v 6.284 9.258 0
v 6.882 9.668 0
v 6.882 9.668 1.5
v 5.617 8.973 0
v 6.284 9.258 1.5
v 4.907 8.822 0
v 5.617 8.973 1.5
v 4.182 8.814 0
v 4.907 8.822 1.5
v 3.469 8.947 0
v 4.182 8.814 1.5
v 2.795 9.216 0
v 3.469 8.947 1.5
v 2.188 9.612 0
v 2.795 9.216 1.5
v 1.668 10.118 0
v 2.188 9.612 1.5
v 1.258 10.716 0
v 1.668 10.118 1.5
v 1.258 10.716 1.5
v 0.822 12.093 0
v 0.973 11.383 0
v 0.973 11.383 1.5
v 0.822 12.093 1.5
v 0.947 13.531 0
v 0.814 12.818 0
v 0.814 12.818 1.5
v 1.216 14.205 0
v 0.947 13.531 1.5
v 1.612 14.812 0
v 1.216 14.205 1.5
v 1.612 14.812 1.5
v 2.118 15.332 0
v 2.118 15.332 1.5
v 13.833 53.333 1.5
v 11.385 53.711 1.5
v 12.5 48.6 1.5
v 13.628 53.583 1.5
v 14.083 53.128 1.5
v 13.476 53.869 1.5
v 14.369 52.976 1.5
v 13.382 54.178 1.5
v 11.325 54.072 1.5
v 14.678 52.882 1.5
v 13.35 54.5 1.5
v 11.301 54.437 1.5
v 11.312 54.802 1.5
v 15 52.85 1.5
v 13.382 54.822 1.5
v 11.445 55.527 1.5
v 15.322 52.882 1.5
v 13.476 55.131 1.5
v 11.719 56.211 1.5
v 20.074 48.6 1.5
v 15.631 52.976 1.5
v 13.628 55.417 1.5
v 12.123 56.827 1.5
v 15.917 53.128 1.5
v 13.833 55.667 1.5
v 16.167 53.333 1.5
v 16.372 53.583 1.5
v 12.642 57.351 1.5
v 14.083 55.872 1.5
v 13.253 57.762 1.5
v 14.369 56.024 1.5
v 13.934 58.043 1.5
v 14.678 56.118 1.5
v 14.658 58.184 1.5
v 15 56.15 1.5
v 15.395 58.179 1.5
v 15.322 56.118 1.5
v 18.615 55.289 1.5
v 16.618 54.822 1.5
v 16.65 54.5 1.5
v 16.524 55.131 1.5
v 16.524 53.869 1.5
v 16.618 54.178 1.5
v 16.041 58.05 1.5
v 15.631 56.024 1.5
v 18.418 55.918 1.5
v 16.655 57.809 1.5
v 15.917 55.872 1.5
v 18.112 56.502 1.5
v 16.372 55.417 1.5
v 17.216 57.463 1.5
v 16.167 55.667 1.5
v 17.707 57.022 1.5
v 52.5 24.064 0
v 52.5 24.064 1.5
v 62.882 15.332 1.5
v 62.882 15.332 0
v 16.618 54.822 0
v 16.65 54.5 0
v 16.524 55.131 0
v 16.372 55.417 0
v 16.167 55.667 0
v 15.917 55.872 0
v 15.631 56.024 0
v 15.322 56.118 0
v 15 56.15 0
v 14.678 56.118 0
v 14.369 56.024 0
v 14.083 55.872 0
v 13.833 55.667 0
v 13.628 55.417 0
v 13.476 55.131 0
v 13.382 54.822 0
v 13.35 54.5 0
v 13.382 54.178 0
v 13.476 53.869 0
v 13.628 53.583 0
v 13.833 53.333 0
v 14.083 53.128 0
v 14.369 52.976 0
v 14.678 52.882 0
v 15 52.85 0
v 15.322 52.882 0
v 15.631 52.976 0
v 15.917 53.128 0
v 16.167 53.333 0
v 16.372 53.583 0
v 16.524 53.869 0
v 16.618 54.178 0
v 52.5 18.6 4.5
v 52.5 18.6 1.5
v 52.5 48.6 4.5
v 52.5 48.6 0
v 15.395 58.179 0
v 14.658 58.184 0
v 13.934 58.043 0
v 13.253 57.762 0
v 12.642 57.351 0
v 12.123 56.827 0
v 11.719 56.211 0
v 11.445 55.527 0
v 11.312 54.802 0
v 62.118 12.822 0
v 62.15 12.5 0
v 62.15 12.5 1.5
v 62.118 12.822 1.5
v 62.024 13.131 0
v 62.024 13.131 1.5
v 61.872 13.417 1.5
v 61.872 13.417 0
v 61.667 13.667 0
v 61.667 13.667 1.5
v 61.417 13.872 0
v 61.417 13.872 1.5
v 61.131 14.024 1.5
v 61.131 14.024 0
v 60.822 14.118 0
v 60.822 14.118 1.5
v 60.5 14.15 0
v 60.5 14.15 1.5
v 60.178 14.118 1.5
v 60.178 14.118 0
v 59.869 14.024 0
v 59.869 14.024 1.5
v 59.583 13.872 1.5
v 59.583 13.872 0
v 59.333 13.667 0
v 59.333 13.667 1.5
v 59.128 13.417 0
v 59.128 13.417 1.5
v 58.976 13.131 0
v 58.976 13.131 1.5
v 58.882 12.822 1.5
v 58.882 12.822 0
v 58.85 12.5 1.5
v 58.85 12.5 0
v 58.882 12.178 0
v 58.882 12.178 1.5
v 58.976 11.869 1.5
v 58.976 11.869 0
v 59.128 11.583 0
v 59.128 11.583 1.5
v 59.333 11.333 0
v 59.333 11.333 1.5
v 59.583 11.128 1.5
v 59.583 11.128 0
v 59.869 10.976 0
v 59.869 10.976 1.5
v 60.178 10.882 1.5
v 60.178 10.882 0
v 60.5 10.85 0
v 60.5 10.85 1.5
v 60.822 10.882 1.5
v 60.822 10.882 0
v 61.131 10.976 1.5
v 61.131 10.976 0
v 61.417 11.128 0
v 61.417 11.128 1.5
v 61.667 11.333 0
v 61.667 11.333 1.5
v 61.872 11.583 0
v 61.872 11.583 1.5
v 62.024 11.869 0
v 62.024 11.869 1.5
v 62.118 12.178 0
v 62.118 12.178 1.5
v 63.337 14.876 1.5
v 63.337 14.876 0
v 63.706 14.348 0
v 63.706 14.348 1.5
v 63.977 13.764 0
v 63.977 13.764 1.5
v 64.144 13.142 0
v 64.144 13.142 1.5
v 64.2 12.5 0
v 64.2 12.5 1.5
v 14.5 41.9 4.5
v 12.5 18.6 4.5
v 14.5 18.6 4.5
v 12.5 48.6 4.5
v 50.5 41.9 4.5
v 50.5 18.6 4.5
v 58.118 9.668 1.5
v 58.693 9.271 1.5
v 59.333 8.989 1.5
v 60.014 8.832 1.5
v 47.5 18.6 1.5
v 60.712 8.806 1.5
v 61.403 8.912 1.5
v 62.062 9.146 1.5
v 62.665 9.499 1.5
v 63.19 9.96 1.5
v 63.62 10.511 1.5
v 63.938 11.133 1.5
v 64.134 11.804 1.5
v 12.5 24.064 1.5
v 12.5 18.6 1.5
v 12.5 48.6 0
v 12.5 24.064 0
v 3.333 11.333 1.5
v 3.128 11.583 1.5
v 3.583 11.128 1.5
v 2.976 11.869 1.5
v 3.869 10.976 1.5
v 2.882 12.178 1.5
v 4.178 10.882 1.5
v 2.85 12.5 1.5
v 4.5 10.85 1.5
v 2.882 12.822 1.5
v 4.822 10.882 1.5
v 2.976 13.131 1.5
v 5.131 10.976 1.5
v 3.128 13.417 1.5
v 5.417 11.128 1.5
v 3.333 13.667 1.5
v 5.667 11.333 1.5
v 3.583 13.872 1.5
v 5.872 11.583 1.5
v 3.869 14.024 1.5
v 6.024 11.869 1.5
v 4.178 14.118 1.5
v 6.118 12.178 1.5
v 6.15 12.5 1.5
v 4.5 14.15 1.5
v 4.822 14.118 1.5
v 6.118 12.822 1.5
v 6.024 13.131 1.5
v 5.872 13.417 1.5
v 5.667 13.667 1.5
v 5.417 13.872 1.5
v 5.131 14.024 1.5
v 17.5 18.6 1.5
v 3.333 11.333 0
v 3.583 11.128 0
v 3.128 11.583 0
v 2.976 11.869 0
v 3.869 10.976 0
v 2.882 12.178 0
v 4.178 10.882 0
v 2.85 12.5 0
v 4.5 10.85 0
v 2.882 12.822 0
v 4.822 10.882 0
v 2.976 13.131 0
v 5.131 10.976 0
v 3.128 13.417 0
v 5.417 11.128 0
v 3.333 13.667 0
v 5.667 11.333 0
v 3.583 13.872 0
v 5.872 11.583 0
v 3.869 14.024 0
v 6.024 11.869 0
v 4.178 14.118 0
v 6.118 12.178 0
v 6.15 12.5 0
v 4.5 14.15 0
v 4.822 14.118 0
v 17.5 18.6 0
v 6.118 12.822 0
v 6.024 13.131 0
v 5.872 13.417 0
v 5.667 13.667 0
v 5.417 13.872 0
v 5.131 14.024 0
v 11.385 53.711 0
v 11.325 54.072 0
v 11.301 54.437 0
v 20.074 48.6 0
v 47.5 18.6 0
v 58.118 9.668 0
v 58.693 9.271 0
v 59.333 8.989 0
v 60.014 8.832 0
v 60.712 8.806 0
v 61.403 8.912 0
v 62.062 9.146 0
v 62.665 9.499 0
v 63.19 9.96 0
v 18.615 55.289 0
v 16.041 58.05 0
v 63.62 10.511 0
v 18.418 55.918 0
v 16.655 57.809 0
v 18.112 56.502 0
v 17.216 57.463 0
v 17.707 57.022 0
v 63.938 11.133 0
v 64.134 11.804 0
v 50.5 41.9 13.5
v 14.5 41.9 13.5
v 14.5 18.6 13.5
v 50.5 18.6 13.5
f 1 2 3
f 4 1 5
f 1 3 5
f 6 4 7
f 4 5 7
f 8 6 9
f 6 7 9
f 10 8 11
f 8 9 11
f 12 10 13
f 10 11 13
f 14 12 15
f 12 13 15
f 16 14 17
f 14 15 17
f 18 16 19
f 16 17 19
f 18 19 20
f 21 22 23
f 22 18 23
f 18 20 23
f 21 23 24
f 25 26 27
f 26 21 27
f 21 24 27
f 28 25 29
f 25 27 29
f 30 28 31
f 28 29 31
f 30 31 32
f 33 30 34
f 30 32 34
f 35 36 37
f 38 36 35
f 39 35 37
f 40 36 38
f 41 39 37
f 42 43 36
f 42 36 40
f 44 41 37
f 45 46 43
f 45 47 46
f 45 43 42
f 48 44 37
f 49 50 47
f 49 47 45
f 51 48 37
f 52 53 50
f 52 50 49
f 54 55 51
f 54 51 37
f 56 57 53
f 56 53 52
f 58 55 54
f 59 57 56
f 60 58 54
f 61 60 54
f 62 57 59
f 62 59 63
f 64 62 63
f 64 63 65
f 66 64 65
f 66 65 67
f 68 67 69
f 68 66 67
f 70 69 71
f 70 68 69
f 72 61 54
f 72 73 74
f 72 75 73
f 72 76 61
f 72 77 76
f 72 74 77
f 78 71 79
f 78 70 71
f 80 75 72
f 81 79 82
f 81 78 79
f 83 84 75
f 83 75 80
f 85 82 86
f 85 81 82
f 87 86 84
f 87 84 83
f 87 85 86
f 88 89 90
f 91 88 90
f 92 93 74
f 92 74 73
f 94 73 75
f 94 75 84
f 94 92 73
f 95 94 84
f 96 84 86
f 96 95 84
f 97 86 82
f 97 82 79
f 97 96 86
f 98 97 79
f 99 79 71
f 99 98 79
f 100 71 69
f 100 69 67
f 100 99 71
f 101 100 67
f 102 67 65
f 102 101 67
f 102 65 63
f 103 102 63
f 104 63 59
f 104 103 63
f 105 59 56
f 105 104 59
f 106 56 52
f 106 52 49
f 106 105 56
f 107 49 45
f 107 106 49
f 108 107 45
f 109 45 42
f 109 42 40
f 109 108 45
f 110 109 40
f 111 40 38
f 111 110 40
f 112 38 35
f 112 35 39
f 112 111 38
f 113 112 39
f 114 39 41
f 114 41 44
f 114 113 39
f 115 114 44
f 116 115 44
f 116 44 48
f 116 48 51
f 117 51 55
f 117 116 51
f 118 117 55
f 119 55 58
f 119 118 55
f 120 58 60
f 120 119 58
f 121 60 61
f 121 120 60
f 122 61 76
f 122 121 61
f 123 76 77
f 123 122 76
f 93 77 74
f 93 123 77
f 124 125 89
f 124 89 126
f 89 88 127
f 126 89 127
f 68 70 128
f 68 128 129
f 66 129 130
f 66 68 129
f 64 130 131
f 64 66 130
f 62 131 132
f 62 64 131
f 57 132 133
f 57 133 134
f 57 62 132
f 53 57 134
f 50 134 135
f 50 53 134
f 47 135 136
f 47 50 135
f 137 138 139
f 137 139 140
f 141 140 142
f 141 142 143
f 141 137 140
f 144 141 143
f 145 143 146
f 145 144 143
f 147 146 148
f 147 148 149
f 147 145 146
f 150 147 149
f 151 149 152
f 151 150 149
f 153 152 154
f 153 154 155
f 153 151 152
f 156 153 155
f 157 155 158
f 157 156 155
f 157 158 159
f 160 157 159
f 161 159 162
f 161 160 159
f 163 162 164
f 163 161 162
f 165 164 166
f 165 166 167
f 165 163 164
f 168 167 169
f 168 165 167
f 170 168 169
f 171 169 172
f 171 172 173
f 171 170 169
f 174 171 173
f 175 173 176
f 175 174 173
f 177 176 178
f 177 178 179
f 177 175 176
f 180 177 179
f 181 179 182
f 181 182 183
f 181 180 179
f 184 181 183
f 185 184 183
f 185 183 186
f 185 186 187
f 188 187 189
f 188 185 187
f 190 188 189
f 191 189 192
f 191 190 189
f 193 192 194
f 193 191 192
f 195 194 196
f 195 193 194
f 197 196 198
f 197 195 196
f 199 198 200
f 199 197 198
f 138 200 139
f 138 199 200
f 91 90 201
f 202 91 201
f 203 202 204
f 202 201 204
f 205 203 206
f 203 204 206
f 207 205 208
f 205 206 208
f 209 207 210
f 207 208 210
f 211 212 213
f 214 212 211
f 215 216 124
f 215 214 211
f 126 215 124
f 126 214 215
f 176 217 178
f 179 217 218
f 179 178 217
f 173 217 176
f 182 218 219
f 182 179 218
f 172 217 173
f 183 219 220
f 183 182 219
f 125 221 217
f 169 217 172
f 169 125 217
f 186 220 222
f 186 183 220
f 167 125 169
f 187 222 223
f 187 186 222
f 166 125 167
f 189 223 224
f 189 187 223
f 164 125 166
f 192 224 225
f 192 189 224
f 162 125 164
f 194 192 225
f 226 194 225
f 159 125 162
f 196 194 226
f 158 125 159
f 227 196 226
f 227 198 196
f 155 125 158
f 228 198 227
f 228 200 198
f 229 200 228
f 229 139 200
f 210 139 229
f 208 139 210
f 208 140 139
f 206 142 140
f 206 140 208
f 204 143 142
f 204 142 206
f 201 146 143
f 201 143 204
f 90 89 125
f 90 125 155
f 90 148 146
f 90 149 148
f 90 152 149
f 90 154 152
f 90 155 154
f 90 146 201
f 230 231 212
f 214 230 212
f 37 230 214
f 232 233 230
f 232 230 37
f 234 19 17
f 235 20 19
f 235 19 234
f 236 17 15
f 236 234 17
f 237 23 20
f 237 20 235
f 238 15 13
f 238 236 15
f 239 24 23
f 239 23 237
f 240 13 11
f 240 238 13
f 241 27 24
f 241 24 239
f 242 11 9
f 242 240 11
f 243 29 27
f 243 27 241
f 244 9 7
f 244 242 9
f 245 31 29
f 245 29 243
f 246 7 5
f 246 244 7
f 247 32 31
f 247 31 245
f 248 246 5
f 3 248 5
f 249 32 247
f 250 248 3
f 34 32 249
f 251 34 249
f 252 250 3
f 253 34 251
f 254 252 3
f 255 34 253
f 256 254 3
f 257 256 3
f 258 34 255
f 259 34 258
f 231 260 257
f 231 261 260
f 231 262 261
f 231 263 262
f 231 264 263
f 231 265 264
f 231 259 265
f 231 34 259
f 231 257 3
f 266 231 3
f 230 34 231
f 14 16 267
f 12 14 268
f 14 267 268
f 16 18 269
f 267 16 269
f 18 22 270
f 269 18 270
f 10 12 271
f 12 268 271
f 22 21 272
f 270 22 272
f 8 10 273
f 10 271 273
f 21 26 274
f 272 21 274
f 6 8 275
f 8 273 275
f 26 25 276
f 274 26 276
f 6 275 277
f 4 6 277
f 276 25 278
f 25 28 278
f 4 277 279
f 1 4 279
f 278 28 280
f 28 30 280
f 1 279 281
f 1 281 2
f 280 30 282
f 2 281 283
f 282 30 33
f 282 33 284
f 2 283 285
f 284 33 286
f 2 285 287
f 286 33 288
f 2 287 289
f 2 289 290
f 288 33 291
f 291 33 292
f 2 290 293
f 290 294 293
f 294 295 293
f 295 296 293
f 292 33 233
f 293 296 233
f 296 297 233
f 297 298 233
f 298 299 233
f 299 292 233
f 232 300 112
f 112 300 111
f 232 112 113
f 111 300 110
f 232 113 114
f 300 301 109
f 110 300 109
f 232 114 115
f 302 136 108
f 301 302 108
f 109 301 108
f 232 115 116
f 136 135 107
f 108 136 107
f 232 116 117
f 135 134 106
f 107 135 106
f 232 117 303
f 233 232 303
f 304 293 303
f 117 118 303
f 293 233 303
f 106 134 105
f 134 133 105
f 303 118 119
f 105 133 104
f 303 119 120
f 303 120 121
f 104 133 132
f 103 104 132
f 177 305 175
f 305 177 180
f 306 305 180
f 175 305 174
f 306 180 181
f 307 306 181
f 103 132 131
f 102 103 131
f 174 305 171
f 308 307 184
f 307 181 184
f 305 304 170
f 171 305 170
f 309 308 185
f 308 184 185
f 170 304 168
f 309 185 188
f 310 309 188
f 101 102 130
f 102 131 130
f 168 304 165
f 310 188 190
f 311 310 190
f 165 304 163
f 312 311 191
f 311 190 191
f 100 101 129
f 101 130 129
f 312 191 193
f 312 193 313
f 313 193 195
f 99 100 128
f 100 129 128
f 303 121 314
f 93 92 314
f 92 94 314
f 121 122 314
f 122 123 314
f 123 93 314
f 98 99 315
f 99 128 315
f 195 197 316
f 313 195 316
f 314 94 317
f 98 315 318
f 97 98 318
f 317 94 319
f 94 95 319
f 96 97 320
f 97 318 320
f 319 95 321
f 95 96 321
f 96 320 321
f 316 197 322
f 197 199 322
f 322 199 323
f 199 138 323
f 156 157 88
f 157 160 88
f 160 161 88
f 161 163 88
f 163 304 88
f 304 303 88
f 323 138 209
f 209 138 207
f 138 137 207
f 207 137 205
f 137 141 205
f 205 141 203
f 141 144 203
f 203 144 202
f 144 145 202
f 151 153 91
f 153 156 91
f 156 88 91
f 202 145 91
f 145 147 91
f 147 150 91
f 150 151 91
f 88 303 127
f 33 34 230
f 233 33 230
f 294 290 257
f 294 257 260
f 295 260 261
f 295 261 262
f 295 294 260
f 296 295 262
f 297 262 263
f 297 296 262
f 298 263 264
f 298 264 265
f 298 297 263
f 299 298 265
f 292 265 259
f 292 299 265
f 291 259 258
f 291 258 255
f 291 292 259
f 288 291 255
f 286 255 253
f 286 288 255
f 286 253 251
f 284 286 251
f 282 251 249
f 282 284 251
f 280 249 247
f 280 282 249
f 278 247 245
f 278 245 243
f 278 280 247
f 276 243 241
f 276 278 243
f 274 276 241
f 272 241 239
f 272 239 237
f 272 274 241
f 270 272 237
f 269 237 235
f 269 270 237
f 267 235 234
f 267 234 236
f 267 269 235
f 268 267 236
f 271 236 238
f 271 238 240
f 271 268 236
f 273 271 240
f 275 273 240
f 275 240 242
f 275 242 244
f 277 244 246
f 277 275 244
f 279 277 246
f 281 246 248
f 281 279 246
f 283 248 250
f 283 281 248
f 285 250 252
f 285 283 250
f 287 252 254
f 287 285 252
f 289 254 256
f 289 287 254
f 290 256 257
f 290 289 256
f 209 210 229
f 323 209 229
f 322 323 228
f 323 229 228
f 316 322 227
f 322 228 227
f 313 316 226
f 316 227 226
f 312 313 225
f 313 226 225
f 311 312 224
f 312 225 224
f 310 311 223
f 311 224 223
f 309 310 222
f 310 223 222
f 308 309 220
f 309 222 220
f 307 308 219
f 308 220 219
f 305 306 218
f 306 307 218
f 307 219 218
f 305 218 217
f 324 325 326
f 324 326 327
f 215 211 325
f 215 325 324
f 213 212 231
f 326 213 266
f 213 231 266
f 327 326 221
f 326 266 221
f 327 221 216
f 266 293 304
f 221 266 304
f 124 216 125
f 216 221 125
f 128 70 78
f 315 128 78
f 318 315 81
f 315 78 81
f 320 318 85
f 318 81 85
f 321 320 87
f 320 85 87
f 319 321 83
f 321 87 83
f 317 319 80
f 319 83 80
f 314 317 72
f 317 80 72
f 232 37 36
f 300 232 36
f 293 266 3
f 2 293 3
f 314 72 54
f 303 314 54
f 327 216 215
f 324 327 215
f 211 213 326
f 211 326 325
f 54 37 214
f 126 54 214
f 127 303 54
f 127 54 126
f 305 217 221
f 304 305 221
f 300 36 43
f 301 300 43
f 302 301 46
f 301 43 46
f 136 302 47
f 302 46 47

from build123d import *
from build123d import SkipClean  # not in build123d's __all__

# Parameters (mm, degrees)
F0_R     = 1.65
F1_DEPTH = 1.5
F3_DEPTH = 1.501
F4_DEPTH = 1.5
F5_W     = 40
F5_H     = 30
F6_DEPTH = 3
F7_W     = 36
F7_H     = 23.3
F8_DEPTH = 9


with BuildPart() as f1:
    # F0 (on Top) → F1 (new body)
    with BuildSketch(Plane.XY):
        with BuildLine():
            ThreePointArc((-0.73370891, 14), (-0.4891889552, 6.9935887205), (0, 0))
            Line((0, 0), (65, 0))
            ThreePointArc((65, 0), (65.4891889552, 6.9935887205), (65.73370891, 14))
            ThreePointArc((65.73370891, 14), (65.7334108185, 21.0021379582), (65.488741818, 28))
            Line((65.488741818, 28), (57.299411547, 50.5))
            ThreePointArc((57.299411547, 50.5), (32.5, 63.5), (7.700588453, 50.5))
            Line((7.700588453, 50.5), (-0.488741818, 28))
            ThreePointArc((-0.488741818, 28), (-0.7334108185, 21.0021379582), (-0.73370891, 14))
        make_face()
        with Locations((4.5, 12.5)):
            Circle(F0_R, mode=Mode.SUBTRACT)
        with Locations((60.5, 12.5)):
            Circle(F0_R, mode=Mode.SUBTRACT)
        with Locations((15, 54.5)):
            Circle(F0_R, mode=Mode.SUBTRACT)
    extrude(amount=F1_DEPTH)

    # F2 (on face) → F3 (cut, through all)
    with BuildSketch(Plane.XY.offset(1.5)):
        with BuildLine():
            ThreePointArc((15.3946260476, 58.178895253), (17.4713893755, 57.2535857631), (18.6149922575, 55.2885626028))
            Line((18.6149922575, 55.2885626028), (20.0740134556, 48.6))
            Line((20.0740134556, 48.6), (52.5, 48.6))
            Line((52.5, 48.6), (52.5, 24.064025175))
            Line((52.5, 24.064025175), (62.8817094627, 15.3315119698))
            ThreePointArc((62.8817094627, 15.3315119698), (63.8542752579, 14.0616777817), (64.2, 12.5))
            ThreePointArc((64.2, 12.5), (62.0616777817, 9.1457247421), (58.1182905373, 9.6684880302))
            Line((58.1182905373, 9.6684880302), (47.5, 18.6))
            Line((47.5, 18.6), (17.5, 18.6))
            Line((17.5, 18.6), (6.8817094627, 9.6684880302))
            ThreePointArc((6.8817094627, 9.6684880302), (1.6684880302, 10.1182905373), (2.1182905373, 15.3315119698))
            Line((2.1182905373, 15.3315119698), (12.5, 24.064025175))
            Line((12.5, 24.064025175), (12.5, 48.6))
            Line((12.5, 48.6), (11.3850077425, 53.7114373972))
            ThreePointArc((11.3850077425, 53.7114373972), (11.308192582, 54.2539146721), (11.3123280961, 54.8017878876))
            ThreePointArc((11.3123280961, 54.8017878876), (9.4060764304, 52.7351735725), (7.700588453, 50.5))
            Line((7.700588453, 50.5), (-0.488741818, 28))
            ThreePointArc((-0.488741818, 28), (-0.733560046, 13.9914611719), (0, 0))
            Line((0, 0), (65, 0))
            ThreePointArc((65, 0), (65.733560046, 13.9914611719), (65.488741818, 28))
            Line((65.488741818, 28), (57.299411547, 50.5))
            ThreePointArc((57.299411547, 50.5), (37.9351551683, 63.0061258111), (15.3946260476, 58.178895253))
        make_face()
    extrude(amount=-F3_DEPTH, mode=Mode.SUBTRACT)

    # F2 (on face) → F4 (join)
    with BuildSketch(Plane.XY.offset(1.5)):
        with BuildLine():
            ThreePointArc((11.3123280961, 54.8017878876), (13.2791635515, 56.5801728664), (15.3946260476, 58.178895253))
            ThreePointArc((15.3946260476, 58.178895253), (12.6415574435, 57.3509206772), (11.3123280961, 54.8017878876))
        make_face()
    with SkipClean():  # cleaning this boolean's faces spoils the solid; the shape is the same uncleaned
        extrude(amount=-F4_DEPTH)

    # F5 (on face) → F6 (join)
    with BuildSketch(Plane.XY.offset(1.5)):
        with Locations((32.5, 33.6)):
            Rectangle(F5_W, F5_H)
    extrude(amount=F6_DEPTH)

    # F7 (on face) → F8 (join)
    with BuildSketch(Plane.XY.offset(4.5)):
        with Locations((32.5, 30.25)):
            Rectangle(F7_W, F7_H)
    extrude(amount=F8_DEPTH)


solid = f1.part
